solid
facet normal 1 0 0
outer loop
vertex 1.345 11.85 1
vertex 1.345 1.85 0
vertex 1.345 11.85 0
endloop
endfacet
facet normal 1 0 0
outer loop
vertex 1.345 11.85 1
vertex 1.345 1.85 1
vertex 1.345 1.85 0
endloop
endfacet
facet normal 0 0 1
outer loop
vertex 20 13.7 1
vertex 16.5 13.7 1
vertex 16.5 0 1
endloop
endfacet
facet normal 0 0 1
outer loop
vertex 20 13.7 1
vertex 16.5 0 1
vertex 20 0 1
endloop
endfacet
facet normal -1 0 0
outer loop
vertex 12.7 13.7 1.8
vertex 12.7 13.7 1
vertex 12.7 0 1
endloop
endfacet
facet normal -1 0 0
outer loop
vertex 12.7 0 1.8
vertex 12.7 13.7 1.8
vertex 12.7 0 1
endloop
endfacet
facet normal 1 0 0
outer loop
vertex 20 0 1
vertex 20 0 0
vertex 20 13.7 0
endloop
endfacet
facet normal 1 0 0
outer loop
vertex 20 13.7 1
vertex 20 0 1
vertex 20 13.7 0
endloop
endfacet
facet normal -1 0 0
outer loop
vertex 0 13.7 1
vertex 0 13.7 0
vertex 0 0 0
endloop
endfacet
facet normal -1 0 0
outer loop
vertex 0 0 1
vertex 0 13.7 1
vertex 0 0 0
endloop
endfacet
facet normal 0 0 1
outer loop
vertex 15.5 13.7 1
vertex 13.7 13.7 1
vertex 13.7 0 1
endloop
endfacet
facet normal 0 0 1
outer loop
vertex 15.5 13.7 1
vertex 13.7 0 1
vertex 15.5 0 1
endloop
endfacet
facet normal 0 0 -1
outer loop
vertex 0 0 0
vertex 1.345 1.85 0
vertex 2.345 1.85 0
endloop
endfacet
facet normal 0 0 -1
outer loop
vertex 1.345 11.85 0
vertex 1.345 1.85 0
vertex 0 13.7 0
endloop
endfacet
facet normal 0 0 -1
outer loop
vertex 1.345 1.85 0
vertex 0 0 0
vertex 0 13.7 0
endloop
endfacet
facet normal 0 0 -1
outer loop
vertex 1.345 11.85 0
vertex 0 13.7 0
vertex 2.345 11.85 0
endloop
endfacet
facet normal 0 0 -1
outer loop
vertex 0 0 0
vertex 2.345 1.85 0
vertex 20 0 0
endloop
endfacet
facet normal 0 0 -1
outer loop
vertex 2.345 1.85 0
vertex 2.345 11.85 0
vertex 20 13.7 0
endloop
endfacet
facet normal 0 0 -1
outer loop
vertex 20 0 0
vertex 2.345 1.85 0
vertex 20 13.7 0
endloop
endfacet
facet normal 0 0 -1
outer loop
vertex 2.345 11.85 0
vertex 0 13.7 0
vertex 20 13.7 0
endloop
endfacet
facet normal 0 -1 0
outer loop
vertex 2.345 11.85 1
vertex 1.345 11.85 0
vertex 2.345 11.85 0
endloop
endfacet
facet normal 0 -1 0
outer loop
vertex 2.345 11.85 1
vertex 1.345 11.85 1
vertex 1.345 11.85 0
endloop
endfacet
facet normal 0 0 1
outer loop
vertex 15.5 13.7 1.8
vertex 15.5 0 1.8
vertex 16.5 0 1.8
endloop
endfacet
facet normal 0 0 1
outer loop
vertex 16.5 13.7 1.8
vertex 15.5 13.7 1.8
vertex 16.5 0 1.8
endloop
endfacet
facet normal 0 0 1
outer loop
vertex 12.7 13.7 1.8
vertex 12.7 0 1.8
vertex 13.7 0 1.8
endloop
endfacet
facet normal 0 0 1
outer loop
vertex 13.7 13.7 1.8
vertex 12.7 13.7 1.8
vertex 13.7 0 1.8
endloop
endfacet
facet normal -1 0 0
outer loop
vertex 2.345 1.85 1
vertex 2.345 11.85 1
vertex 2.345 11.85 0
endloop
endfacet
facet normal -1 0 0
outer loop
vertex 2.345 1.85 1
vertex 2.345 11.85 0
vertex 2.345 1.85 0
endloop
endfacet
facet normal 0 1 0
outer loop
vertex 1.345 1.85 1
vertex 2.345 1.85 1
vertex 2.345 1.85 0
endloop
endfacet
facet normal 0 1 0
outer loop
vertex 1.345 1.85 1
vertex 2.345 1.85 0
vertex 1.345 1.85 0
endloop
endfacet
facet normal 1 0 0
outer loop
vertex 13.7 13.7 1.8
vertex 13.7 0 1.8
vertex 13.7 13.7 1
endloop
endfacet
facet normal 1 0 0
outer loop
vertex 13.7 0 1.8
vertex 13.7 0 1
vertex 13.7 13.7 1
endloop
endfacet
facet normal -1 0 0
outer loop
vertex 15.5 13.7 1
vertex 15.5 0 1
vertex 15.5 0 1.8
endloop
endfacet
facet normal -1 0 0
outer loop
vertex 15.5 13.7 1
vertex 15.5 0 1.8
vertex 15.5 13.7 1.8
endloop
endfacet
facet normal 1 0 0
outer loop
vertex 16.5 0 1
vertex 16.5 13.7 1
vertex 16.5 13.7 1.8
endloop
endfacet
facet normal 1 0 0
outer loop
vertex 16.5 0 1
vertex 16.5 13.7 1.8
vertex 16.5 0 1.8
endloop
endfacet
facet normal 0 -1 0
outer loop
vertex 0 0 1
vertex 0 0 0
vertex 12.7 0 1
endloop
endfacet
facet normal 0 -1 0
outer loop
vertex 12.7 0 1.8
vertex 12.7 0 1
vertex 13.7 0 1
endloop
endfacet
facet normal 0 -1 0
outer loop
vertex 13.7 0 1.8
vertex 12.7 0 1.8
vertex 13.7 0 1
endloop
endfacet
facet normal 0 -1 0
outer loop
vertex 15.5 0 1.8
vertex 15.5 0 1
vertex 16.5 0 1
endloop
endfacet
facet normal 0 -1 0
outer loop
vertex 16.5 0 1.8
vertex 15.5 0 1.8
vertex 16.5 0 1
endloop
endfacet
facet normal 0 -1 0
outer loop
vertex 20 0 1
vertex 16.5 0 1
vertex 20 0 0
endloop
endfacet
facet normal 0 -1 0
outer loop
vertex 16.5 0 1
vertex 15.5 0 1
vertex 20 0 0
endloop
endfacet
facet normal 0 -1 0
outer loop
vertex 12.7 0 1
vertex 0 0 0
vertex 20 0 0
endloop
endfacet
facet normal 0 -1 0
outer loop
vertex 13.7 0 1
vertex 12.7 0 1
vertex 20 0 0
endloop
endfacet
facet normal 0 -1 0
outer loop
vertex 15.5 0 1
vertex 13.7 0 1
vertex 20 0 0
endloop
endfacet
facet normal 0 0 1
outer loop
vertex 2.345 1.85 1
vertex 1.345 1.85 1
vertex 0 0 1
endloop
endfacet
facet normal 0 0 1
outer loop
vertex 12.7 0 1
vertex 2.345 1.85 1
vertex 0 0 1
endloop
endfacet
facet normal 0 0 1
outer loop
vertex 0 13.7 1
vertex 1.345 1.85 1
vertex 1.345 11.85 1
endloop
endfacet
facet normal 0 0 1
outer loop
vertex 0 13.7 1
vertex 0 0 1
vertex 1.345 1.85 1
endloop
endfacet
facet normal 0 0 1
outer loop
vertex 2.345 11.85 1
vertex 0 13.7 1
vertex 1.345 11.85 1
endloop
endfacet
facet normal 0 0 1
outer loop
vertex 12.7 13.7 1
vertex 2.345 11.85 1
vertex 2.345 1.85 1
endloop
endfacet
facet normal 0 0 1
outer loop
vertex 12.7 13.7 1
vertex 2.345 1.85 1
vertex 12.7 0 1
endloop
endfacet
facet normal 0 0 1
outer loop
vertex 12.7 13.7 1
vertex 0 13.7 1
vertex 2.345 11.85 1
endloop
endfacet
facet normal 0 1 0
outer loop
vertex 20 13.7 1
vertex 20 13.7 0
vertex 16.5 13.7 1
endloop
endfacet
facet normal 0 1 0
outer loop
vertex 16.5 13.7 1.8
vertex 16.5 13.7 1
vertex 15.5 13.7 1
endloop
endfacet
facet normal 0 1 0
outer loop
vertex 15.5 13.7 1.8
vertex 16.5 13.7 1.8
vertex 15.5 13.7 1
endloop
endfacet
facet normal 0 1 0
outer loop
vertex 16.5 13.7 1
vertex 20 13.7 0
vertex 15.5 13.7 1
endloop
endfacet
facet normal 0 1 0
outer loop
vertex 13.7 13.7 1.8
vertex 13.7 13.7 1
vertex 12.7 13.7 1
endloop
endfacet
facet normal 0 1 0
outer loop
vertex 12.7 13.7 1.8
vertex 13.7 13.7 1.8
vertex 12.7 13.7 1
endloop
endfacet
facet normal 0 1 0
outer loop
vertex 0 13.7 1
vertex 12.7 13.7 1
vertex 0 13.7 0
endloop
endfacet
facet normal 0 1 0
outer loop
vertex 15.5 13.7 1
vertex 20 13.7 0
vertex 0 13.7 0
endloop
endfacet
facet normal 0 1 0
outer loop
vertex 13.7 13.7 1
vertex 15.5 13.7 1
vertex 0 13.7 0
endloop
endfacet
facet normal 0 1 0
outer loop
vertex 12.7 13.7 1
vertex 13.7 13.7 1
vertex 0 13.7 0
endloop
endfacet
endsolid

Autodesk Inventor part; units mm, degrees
ref_plane "YZ Plane" through (0, 0, 0) normal (1, 0, 0) x (0, 1, 0)
ref_plane "XZ Plane" through (0, 0, 0) normal (0, 1, 0) x (-1, 0, 0)
ref_plane "XY Plane" through (0, 0, 0) normal (0, 0, 1) x (1, 0, 0)
sketch "Sketch1" plane through (0, 0, 0) normal (0, 0, 1) x (1, 0, 0)
  line L0 (0, 0) -> (20, 0)
  line L1 (20, 0) -> (20, 13.7)
  line L2 (20, 13.7) -> (0, 13.7)
  line L3 (0, 13.7) -> (0, 0)
  dimension "d0" = 20
  dimension "d1" = 13.7
extrude "Extrusion1" add sketch "Sketch1" along normal blind 1
sketch "Sketch2" plane through (0, 0, 1) normal (0, 0, 1) x (1, 0, 0)
  line L0 (0, 0) -> (20, 0) projected
  line L1 (20, 13.7) -> (0, 13.7) projected
  line L2 (13.7, 13.7) -> (12.7, 13.7)
  line L3 (12.7, 13.7) -> (12.7, 0)
  line L4 (12.7, 0) -> (13.7, 0)
  line L5 (13.7, 0) -> (13.7, 13.7)
  line L6 (15.5, 13.7) -> (16.5, 13.7)
  line L7 (16.5, 13.7) -> (16.5, 0)
  line L8 (16.5, 0) -> (15.5, 0)
  line L9 (15.5, 0) -> (15.5, 13.7)
  dimension "d4" = 1
  dimension "d5" = 1
  dimension "d6" = 1.8
  dimension "d9" = 3.5
extrude "Extrusion2" add sketch "Sketch2" along normal blind 0.8 contours L3 L1 L5 L0 | L9 L1 L7 L0
sketch "Sketch3" plane through (0, 0, 1) normal (0, 0, 1) x (1, 0, 0)
  line L0 (2.3449, 1.85) -> (1.3449, 1.85)
  line L1 (1.3449, 1.85) -> (1.3449, 11.85)
  line L2 (1.3449, 11.85) -> (2.3449, 11.85)
  line L3 (2.3449, 11.85) -> (2.3449, 1.85)
  line L4 (12.7, 13.7) -> (0, 13.7) projected
  line L5 (0, 0) -> (12.7, 0) projected
  dimension "d10" = 1
  dimension "d11" = 10
  dimension "d14" = 1.85
  dimension "d15" = 1.85
extrude "Extrusion3" cut sketch "Sketch3" against normal blind 10
properties part number "Zijkant 4"
